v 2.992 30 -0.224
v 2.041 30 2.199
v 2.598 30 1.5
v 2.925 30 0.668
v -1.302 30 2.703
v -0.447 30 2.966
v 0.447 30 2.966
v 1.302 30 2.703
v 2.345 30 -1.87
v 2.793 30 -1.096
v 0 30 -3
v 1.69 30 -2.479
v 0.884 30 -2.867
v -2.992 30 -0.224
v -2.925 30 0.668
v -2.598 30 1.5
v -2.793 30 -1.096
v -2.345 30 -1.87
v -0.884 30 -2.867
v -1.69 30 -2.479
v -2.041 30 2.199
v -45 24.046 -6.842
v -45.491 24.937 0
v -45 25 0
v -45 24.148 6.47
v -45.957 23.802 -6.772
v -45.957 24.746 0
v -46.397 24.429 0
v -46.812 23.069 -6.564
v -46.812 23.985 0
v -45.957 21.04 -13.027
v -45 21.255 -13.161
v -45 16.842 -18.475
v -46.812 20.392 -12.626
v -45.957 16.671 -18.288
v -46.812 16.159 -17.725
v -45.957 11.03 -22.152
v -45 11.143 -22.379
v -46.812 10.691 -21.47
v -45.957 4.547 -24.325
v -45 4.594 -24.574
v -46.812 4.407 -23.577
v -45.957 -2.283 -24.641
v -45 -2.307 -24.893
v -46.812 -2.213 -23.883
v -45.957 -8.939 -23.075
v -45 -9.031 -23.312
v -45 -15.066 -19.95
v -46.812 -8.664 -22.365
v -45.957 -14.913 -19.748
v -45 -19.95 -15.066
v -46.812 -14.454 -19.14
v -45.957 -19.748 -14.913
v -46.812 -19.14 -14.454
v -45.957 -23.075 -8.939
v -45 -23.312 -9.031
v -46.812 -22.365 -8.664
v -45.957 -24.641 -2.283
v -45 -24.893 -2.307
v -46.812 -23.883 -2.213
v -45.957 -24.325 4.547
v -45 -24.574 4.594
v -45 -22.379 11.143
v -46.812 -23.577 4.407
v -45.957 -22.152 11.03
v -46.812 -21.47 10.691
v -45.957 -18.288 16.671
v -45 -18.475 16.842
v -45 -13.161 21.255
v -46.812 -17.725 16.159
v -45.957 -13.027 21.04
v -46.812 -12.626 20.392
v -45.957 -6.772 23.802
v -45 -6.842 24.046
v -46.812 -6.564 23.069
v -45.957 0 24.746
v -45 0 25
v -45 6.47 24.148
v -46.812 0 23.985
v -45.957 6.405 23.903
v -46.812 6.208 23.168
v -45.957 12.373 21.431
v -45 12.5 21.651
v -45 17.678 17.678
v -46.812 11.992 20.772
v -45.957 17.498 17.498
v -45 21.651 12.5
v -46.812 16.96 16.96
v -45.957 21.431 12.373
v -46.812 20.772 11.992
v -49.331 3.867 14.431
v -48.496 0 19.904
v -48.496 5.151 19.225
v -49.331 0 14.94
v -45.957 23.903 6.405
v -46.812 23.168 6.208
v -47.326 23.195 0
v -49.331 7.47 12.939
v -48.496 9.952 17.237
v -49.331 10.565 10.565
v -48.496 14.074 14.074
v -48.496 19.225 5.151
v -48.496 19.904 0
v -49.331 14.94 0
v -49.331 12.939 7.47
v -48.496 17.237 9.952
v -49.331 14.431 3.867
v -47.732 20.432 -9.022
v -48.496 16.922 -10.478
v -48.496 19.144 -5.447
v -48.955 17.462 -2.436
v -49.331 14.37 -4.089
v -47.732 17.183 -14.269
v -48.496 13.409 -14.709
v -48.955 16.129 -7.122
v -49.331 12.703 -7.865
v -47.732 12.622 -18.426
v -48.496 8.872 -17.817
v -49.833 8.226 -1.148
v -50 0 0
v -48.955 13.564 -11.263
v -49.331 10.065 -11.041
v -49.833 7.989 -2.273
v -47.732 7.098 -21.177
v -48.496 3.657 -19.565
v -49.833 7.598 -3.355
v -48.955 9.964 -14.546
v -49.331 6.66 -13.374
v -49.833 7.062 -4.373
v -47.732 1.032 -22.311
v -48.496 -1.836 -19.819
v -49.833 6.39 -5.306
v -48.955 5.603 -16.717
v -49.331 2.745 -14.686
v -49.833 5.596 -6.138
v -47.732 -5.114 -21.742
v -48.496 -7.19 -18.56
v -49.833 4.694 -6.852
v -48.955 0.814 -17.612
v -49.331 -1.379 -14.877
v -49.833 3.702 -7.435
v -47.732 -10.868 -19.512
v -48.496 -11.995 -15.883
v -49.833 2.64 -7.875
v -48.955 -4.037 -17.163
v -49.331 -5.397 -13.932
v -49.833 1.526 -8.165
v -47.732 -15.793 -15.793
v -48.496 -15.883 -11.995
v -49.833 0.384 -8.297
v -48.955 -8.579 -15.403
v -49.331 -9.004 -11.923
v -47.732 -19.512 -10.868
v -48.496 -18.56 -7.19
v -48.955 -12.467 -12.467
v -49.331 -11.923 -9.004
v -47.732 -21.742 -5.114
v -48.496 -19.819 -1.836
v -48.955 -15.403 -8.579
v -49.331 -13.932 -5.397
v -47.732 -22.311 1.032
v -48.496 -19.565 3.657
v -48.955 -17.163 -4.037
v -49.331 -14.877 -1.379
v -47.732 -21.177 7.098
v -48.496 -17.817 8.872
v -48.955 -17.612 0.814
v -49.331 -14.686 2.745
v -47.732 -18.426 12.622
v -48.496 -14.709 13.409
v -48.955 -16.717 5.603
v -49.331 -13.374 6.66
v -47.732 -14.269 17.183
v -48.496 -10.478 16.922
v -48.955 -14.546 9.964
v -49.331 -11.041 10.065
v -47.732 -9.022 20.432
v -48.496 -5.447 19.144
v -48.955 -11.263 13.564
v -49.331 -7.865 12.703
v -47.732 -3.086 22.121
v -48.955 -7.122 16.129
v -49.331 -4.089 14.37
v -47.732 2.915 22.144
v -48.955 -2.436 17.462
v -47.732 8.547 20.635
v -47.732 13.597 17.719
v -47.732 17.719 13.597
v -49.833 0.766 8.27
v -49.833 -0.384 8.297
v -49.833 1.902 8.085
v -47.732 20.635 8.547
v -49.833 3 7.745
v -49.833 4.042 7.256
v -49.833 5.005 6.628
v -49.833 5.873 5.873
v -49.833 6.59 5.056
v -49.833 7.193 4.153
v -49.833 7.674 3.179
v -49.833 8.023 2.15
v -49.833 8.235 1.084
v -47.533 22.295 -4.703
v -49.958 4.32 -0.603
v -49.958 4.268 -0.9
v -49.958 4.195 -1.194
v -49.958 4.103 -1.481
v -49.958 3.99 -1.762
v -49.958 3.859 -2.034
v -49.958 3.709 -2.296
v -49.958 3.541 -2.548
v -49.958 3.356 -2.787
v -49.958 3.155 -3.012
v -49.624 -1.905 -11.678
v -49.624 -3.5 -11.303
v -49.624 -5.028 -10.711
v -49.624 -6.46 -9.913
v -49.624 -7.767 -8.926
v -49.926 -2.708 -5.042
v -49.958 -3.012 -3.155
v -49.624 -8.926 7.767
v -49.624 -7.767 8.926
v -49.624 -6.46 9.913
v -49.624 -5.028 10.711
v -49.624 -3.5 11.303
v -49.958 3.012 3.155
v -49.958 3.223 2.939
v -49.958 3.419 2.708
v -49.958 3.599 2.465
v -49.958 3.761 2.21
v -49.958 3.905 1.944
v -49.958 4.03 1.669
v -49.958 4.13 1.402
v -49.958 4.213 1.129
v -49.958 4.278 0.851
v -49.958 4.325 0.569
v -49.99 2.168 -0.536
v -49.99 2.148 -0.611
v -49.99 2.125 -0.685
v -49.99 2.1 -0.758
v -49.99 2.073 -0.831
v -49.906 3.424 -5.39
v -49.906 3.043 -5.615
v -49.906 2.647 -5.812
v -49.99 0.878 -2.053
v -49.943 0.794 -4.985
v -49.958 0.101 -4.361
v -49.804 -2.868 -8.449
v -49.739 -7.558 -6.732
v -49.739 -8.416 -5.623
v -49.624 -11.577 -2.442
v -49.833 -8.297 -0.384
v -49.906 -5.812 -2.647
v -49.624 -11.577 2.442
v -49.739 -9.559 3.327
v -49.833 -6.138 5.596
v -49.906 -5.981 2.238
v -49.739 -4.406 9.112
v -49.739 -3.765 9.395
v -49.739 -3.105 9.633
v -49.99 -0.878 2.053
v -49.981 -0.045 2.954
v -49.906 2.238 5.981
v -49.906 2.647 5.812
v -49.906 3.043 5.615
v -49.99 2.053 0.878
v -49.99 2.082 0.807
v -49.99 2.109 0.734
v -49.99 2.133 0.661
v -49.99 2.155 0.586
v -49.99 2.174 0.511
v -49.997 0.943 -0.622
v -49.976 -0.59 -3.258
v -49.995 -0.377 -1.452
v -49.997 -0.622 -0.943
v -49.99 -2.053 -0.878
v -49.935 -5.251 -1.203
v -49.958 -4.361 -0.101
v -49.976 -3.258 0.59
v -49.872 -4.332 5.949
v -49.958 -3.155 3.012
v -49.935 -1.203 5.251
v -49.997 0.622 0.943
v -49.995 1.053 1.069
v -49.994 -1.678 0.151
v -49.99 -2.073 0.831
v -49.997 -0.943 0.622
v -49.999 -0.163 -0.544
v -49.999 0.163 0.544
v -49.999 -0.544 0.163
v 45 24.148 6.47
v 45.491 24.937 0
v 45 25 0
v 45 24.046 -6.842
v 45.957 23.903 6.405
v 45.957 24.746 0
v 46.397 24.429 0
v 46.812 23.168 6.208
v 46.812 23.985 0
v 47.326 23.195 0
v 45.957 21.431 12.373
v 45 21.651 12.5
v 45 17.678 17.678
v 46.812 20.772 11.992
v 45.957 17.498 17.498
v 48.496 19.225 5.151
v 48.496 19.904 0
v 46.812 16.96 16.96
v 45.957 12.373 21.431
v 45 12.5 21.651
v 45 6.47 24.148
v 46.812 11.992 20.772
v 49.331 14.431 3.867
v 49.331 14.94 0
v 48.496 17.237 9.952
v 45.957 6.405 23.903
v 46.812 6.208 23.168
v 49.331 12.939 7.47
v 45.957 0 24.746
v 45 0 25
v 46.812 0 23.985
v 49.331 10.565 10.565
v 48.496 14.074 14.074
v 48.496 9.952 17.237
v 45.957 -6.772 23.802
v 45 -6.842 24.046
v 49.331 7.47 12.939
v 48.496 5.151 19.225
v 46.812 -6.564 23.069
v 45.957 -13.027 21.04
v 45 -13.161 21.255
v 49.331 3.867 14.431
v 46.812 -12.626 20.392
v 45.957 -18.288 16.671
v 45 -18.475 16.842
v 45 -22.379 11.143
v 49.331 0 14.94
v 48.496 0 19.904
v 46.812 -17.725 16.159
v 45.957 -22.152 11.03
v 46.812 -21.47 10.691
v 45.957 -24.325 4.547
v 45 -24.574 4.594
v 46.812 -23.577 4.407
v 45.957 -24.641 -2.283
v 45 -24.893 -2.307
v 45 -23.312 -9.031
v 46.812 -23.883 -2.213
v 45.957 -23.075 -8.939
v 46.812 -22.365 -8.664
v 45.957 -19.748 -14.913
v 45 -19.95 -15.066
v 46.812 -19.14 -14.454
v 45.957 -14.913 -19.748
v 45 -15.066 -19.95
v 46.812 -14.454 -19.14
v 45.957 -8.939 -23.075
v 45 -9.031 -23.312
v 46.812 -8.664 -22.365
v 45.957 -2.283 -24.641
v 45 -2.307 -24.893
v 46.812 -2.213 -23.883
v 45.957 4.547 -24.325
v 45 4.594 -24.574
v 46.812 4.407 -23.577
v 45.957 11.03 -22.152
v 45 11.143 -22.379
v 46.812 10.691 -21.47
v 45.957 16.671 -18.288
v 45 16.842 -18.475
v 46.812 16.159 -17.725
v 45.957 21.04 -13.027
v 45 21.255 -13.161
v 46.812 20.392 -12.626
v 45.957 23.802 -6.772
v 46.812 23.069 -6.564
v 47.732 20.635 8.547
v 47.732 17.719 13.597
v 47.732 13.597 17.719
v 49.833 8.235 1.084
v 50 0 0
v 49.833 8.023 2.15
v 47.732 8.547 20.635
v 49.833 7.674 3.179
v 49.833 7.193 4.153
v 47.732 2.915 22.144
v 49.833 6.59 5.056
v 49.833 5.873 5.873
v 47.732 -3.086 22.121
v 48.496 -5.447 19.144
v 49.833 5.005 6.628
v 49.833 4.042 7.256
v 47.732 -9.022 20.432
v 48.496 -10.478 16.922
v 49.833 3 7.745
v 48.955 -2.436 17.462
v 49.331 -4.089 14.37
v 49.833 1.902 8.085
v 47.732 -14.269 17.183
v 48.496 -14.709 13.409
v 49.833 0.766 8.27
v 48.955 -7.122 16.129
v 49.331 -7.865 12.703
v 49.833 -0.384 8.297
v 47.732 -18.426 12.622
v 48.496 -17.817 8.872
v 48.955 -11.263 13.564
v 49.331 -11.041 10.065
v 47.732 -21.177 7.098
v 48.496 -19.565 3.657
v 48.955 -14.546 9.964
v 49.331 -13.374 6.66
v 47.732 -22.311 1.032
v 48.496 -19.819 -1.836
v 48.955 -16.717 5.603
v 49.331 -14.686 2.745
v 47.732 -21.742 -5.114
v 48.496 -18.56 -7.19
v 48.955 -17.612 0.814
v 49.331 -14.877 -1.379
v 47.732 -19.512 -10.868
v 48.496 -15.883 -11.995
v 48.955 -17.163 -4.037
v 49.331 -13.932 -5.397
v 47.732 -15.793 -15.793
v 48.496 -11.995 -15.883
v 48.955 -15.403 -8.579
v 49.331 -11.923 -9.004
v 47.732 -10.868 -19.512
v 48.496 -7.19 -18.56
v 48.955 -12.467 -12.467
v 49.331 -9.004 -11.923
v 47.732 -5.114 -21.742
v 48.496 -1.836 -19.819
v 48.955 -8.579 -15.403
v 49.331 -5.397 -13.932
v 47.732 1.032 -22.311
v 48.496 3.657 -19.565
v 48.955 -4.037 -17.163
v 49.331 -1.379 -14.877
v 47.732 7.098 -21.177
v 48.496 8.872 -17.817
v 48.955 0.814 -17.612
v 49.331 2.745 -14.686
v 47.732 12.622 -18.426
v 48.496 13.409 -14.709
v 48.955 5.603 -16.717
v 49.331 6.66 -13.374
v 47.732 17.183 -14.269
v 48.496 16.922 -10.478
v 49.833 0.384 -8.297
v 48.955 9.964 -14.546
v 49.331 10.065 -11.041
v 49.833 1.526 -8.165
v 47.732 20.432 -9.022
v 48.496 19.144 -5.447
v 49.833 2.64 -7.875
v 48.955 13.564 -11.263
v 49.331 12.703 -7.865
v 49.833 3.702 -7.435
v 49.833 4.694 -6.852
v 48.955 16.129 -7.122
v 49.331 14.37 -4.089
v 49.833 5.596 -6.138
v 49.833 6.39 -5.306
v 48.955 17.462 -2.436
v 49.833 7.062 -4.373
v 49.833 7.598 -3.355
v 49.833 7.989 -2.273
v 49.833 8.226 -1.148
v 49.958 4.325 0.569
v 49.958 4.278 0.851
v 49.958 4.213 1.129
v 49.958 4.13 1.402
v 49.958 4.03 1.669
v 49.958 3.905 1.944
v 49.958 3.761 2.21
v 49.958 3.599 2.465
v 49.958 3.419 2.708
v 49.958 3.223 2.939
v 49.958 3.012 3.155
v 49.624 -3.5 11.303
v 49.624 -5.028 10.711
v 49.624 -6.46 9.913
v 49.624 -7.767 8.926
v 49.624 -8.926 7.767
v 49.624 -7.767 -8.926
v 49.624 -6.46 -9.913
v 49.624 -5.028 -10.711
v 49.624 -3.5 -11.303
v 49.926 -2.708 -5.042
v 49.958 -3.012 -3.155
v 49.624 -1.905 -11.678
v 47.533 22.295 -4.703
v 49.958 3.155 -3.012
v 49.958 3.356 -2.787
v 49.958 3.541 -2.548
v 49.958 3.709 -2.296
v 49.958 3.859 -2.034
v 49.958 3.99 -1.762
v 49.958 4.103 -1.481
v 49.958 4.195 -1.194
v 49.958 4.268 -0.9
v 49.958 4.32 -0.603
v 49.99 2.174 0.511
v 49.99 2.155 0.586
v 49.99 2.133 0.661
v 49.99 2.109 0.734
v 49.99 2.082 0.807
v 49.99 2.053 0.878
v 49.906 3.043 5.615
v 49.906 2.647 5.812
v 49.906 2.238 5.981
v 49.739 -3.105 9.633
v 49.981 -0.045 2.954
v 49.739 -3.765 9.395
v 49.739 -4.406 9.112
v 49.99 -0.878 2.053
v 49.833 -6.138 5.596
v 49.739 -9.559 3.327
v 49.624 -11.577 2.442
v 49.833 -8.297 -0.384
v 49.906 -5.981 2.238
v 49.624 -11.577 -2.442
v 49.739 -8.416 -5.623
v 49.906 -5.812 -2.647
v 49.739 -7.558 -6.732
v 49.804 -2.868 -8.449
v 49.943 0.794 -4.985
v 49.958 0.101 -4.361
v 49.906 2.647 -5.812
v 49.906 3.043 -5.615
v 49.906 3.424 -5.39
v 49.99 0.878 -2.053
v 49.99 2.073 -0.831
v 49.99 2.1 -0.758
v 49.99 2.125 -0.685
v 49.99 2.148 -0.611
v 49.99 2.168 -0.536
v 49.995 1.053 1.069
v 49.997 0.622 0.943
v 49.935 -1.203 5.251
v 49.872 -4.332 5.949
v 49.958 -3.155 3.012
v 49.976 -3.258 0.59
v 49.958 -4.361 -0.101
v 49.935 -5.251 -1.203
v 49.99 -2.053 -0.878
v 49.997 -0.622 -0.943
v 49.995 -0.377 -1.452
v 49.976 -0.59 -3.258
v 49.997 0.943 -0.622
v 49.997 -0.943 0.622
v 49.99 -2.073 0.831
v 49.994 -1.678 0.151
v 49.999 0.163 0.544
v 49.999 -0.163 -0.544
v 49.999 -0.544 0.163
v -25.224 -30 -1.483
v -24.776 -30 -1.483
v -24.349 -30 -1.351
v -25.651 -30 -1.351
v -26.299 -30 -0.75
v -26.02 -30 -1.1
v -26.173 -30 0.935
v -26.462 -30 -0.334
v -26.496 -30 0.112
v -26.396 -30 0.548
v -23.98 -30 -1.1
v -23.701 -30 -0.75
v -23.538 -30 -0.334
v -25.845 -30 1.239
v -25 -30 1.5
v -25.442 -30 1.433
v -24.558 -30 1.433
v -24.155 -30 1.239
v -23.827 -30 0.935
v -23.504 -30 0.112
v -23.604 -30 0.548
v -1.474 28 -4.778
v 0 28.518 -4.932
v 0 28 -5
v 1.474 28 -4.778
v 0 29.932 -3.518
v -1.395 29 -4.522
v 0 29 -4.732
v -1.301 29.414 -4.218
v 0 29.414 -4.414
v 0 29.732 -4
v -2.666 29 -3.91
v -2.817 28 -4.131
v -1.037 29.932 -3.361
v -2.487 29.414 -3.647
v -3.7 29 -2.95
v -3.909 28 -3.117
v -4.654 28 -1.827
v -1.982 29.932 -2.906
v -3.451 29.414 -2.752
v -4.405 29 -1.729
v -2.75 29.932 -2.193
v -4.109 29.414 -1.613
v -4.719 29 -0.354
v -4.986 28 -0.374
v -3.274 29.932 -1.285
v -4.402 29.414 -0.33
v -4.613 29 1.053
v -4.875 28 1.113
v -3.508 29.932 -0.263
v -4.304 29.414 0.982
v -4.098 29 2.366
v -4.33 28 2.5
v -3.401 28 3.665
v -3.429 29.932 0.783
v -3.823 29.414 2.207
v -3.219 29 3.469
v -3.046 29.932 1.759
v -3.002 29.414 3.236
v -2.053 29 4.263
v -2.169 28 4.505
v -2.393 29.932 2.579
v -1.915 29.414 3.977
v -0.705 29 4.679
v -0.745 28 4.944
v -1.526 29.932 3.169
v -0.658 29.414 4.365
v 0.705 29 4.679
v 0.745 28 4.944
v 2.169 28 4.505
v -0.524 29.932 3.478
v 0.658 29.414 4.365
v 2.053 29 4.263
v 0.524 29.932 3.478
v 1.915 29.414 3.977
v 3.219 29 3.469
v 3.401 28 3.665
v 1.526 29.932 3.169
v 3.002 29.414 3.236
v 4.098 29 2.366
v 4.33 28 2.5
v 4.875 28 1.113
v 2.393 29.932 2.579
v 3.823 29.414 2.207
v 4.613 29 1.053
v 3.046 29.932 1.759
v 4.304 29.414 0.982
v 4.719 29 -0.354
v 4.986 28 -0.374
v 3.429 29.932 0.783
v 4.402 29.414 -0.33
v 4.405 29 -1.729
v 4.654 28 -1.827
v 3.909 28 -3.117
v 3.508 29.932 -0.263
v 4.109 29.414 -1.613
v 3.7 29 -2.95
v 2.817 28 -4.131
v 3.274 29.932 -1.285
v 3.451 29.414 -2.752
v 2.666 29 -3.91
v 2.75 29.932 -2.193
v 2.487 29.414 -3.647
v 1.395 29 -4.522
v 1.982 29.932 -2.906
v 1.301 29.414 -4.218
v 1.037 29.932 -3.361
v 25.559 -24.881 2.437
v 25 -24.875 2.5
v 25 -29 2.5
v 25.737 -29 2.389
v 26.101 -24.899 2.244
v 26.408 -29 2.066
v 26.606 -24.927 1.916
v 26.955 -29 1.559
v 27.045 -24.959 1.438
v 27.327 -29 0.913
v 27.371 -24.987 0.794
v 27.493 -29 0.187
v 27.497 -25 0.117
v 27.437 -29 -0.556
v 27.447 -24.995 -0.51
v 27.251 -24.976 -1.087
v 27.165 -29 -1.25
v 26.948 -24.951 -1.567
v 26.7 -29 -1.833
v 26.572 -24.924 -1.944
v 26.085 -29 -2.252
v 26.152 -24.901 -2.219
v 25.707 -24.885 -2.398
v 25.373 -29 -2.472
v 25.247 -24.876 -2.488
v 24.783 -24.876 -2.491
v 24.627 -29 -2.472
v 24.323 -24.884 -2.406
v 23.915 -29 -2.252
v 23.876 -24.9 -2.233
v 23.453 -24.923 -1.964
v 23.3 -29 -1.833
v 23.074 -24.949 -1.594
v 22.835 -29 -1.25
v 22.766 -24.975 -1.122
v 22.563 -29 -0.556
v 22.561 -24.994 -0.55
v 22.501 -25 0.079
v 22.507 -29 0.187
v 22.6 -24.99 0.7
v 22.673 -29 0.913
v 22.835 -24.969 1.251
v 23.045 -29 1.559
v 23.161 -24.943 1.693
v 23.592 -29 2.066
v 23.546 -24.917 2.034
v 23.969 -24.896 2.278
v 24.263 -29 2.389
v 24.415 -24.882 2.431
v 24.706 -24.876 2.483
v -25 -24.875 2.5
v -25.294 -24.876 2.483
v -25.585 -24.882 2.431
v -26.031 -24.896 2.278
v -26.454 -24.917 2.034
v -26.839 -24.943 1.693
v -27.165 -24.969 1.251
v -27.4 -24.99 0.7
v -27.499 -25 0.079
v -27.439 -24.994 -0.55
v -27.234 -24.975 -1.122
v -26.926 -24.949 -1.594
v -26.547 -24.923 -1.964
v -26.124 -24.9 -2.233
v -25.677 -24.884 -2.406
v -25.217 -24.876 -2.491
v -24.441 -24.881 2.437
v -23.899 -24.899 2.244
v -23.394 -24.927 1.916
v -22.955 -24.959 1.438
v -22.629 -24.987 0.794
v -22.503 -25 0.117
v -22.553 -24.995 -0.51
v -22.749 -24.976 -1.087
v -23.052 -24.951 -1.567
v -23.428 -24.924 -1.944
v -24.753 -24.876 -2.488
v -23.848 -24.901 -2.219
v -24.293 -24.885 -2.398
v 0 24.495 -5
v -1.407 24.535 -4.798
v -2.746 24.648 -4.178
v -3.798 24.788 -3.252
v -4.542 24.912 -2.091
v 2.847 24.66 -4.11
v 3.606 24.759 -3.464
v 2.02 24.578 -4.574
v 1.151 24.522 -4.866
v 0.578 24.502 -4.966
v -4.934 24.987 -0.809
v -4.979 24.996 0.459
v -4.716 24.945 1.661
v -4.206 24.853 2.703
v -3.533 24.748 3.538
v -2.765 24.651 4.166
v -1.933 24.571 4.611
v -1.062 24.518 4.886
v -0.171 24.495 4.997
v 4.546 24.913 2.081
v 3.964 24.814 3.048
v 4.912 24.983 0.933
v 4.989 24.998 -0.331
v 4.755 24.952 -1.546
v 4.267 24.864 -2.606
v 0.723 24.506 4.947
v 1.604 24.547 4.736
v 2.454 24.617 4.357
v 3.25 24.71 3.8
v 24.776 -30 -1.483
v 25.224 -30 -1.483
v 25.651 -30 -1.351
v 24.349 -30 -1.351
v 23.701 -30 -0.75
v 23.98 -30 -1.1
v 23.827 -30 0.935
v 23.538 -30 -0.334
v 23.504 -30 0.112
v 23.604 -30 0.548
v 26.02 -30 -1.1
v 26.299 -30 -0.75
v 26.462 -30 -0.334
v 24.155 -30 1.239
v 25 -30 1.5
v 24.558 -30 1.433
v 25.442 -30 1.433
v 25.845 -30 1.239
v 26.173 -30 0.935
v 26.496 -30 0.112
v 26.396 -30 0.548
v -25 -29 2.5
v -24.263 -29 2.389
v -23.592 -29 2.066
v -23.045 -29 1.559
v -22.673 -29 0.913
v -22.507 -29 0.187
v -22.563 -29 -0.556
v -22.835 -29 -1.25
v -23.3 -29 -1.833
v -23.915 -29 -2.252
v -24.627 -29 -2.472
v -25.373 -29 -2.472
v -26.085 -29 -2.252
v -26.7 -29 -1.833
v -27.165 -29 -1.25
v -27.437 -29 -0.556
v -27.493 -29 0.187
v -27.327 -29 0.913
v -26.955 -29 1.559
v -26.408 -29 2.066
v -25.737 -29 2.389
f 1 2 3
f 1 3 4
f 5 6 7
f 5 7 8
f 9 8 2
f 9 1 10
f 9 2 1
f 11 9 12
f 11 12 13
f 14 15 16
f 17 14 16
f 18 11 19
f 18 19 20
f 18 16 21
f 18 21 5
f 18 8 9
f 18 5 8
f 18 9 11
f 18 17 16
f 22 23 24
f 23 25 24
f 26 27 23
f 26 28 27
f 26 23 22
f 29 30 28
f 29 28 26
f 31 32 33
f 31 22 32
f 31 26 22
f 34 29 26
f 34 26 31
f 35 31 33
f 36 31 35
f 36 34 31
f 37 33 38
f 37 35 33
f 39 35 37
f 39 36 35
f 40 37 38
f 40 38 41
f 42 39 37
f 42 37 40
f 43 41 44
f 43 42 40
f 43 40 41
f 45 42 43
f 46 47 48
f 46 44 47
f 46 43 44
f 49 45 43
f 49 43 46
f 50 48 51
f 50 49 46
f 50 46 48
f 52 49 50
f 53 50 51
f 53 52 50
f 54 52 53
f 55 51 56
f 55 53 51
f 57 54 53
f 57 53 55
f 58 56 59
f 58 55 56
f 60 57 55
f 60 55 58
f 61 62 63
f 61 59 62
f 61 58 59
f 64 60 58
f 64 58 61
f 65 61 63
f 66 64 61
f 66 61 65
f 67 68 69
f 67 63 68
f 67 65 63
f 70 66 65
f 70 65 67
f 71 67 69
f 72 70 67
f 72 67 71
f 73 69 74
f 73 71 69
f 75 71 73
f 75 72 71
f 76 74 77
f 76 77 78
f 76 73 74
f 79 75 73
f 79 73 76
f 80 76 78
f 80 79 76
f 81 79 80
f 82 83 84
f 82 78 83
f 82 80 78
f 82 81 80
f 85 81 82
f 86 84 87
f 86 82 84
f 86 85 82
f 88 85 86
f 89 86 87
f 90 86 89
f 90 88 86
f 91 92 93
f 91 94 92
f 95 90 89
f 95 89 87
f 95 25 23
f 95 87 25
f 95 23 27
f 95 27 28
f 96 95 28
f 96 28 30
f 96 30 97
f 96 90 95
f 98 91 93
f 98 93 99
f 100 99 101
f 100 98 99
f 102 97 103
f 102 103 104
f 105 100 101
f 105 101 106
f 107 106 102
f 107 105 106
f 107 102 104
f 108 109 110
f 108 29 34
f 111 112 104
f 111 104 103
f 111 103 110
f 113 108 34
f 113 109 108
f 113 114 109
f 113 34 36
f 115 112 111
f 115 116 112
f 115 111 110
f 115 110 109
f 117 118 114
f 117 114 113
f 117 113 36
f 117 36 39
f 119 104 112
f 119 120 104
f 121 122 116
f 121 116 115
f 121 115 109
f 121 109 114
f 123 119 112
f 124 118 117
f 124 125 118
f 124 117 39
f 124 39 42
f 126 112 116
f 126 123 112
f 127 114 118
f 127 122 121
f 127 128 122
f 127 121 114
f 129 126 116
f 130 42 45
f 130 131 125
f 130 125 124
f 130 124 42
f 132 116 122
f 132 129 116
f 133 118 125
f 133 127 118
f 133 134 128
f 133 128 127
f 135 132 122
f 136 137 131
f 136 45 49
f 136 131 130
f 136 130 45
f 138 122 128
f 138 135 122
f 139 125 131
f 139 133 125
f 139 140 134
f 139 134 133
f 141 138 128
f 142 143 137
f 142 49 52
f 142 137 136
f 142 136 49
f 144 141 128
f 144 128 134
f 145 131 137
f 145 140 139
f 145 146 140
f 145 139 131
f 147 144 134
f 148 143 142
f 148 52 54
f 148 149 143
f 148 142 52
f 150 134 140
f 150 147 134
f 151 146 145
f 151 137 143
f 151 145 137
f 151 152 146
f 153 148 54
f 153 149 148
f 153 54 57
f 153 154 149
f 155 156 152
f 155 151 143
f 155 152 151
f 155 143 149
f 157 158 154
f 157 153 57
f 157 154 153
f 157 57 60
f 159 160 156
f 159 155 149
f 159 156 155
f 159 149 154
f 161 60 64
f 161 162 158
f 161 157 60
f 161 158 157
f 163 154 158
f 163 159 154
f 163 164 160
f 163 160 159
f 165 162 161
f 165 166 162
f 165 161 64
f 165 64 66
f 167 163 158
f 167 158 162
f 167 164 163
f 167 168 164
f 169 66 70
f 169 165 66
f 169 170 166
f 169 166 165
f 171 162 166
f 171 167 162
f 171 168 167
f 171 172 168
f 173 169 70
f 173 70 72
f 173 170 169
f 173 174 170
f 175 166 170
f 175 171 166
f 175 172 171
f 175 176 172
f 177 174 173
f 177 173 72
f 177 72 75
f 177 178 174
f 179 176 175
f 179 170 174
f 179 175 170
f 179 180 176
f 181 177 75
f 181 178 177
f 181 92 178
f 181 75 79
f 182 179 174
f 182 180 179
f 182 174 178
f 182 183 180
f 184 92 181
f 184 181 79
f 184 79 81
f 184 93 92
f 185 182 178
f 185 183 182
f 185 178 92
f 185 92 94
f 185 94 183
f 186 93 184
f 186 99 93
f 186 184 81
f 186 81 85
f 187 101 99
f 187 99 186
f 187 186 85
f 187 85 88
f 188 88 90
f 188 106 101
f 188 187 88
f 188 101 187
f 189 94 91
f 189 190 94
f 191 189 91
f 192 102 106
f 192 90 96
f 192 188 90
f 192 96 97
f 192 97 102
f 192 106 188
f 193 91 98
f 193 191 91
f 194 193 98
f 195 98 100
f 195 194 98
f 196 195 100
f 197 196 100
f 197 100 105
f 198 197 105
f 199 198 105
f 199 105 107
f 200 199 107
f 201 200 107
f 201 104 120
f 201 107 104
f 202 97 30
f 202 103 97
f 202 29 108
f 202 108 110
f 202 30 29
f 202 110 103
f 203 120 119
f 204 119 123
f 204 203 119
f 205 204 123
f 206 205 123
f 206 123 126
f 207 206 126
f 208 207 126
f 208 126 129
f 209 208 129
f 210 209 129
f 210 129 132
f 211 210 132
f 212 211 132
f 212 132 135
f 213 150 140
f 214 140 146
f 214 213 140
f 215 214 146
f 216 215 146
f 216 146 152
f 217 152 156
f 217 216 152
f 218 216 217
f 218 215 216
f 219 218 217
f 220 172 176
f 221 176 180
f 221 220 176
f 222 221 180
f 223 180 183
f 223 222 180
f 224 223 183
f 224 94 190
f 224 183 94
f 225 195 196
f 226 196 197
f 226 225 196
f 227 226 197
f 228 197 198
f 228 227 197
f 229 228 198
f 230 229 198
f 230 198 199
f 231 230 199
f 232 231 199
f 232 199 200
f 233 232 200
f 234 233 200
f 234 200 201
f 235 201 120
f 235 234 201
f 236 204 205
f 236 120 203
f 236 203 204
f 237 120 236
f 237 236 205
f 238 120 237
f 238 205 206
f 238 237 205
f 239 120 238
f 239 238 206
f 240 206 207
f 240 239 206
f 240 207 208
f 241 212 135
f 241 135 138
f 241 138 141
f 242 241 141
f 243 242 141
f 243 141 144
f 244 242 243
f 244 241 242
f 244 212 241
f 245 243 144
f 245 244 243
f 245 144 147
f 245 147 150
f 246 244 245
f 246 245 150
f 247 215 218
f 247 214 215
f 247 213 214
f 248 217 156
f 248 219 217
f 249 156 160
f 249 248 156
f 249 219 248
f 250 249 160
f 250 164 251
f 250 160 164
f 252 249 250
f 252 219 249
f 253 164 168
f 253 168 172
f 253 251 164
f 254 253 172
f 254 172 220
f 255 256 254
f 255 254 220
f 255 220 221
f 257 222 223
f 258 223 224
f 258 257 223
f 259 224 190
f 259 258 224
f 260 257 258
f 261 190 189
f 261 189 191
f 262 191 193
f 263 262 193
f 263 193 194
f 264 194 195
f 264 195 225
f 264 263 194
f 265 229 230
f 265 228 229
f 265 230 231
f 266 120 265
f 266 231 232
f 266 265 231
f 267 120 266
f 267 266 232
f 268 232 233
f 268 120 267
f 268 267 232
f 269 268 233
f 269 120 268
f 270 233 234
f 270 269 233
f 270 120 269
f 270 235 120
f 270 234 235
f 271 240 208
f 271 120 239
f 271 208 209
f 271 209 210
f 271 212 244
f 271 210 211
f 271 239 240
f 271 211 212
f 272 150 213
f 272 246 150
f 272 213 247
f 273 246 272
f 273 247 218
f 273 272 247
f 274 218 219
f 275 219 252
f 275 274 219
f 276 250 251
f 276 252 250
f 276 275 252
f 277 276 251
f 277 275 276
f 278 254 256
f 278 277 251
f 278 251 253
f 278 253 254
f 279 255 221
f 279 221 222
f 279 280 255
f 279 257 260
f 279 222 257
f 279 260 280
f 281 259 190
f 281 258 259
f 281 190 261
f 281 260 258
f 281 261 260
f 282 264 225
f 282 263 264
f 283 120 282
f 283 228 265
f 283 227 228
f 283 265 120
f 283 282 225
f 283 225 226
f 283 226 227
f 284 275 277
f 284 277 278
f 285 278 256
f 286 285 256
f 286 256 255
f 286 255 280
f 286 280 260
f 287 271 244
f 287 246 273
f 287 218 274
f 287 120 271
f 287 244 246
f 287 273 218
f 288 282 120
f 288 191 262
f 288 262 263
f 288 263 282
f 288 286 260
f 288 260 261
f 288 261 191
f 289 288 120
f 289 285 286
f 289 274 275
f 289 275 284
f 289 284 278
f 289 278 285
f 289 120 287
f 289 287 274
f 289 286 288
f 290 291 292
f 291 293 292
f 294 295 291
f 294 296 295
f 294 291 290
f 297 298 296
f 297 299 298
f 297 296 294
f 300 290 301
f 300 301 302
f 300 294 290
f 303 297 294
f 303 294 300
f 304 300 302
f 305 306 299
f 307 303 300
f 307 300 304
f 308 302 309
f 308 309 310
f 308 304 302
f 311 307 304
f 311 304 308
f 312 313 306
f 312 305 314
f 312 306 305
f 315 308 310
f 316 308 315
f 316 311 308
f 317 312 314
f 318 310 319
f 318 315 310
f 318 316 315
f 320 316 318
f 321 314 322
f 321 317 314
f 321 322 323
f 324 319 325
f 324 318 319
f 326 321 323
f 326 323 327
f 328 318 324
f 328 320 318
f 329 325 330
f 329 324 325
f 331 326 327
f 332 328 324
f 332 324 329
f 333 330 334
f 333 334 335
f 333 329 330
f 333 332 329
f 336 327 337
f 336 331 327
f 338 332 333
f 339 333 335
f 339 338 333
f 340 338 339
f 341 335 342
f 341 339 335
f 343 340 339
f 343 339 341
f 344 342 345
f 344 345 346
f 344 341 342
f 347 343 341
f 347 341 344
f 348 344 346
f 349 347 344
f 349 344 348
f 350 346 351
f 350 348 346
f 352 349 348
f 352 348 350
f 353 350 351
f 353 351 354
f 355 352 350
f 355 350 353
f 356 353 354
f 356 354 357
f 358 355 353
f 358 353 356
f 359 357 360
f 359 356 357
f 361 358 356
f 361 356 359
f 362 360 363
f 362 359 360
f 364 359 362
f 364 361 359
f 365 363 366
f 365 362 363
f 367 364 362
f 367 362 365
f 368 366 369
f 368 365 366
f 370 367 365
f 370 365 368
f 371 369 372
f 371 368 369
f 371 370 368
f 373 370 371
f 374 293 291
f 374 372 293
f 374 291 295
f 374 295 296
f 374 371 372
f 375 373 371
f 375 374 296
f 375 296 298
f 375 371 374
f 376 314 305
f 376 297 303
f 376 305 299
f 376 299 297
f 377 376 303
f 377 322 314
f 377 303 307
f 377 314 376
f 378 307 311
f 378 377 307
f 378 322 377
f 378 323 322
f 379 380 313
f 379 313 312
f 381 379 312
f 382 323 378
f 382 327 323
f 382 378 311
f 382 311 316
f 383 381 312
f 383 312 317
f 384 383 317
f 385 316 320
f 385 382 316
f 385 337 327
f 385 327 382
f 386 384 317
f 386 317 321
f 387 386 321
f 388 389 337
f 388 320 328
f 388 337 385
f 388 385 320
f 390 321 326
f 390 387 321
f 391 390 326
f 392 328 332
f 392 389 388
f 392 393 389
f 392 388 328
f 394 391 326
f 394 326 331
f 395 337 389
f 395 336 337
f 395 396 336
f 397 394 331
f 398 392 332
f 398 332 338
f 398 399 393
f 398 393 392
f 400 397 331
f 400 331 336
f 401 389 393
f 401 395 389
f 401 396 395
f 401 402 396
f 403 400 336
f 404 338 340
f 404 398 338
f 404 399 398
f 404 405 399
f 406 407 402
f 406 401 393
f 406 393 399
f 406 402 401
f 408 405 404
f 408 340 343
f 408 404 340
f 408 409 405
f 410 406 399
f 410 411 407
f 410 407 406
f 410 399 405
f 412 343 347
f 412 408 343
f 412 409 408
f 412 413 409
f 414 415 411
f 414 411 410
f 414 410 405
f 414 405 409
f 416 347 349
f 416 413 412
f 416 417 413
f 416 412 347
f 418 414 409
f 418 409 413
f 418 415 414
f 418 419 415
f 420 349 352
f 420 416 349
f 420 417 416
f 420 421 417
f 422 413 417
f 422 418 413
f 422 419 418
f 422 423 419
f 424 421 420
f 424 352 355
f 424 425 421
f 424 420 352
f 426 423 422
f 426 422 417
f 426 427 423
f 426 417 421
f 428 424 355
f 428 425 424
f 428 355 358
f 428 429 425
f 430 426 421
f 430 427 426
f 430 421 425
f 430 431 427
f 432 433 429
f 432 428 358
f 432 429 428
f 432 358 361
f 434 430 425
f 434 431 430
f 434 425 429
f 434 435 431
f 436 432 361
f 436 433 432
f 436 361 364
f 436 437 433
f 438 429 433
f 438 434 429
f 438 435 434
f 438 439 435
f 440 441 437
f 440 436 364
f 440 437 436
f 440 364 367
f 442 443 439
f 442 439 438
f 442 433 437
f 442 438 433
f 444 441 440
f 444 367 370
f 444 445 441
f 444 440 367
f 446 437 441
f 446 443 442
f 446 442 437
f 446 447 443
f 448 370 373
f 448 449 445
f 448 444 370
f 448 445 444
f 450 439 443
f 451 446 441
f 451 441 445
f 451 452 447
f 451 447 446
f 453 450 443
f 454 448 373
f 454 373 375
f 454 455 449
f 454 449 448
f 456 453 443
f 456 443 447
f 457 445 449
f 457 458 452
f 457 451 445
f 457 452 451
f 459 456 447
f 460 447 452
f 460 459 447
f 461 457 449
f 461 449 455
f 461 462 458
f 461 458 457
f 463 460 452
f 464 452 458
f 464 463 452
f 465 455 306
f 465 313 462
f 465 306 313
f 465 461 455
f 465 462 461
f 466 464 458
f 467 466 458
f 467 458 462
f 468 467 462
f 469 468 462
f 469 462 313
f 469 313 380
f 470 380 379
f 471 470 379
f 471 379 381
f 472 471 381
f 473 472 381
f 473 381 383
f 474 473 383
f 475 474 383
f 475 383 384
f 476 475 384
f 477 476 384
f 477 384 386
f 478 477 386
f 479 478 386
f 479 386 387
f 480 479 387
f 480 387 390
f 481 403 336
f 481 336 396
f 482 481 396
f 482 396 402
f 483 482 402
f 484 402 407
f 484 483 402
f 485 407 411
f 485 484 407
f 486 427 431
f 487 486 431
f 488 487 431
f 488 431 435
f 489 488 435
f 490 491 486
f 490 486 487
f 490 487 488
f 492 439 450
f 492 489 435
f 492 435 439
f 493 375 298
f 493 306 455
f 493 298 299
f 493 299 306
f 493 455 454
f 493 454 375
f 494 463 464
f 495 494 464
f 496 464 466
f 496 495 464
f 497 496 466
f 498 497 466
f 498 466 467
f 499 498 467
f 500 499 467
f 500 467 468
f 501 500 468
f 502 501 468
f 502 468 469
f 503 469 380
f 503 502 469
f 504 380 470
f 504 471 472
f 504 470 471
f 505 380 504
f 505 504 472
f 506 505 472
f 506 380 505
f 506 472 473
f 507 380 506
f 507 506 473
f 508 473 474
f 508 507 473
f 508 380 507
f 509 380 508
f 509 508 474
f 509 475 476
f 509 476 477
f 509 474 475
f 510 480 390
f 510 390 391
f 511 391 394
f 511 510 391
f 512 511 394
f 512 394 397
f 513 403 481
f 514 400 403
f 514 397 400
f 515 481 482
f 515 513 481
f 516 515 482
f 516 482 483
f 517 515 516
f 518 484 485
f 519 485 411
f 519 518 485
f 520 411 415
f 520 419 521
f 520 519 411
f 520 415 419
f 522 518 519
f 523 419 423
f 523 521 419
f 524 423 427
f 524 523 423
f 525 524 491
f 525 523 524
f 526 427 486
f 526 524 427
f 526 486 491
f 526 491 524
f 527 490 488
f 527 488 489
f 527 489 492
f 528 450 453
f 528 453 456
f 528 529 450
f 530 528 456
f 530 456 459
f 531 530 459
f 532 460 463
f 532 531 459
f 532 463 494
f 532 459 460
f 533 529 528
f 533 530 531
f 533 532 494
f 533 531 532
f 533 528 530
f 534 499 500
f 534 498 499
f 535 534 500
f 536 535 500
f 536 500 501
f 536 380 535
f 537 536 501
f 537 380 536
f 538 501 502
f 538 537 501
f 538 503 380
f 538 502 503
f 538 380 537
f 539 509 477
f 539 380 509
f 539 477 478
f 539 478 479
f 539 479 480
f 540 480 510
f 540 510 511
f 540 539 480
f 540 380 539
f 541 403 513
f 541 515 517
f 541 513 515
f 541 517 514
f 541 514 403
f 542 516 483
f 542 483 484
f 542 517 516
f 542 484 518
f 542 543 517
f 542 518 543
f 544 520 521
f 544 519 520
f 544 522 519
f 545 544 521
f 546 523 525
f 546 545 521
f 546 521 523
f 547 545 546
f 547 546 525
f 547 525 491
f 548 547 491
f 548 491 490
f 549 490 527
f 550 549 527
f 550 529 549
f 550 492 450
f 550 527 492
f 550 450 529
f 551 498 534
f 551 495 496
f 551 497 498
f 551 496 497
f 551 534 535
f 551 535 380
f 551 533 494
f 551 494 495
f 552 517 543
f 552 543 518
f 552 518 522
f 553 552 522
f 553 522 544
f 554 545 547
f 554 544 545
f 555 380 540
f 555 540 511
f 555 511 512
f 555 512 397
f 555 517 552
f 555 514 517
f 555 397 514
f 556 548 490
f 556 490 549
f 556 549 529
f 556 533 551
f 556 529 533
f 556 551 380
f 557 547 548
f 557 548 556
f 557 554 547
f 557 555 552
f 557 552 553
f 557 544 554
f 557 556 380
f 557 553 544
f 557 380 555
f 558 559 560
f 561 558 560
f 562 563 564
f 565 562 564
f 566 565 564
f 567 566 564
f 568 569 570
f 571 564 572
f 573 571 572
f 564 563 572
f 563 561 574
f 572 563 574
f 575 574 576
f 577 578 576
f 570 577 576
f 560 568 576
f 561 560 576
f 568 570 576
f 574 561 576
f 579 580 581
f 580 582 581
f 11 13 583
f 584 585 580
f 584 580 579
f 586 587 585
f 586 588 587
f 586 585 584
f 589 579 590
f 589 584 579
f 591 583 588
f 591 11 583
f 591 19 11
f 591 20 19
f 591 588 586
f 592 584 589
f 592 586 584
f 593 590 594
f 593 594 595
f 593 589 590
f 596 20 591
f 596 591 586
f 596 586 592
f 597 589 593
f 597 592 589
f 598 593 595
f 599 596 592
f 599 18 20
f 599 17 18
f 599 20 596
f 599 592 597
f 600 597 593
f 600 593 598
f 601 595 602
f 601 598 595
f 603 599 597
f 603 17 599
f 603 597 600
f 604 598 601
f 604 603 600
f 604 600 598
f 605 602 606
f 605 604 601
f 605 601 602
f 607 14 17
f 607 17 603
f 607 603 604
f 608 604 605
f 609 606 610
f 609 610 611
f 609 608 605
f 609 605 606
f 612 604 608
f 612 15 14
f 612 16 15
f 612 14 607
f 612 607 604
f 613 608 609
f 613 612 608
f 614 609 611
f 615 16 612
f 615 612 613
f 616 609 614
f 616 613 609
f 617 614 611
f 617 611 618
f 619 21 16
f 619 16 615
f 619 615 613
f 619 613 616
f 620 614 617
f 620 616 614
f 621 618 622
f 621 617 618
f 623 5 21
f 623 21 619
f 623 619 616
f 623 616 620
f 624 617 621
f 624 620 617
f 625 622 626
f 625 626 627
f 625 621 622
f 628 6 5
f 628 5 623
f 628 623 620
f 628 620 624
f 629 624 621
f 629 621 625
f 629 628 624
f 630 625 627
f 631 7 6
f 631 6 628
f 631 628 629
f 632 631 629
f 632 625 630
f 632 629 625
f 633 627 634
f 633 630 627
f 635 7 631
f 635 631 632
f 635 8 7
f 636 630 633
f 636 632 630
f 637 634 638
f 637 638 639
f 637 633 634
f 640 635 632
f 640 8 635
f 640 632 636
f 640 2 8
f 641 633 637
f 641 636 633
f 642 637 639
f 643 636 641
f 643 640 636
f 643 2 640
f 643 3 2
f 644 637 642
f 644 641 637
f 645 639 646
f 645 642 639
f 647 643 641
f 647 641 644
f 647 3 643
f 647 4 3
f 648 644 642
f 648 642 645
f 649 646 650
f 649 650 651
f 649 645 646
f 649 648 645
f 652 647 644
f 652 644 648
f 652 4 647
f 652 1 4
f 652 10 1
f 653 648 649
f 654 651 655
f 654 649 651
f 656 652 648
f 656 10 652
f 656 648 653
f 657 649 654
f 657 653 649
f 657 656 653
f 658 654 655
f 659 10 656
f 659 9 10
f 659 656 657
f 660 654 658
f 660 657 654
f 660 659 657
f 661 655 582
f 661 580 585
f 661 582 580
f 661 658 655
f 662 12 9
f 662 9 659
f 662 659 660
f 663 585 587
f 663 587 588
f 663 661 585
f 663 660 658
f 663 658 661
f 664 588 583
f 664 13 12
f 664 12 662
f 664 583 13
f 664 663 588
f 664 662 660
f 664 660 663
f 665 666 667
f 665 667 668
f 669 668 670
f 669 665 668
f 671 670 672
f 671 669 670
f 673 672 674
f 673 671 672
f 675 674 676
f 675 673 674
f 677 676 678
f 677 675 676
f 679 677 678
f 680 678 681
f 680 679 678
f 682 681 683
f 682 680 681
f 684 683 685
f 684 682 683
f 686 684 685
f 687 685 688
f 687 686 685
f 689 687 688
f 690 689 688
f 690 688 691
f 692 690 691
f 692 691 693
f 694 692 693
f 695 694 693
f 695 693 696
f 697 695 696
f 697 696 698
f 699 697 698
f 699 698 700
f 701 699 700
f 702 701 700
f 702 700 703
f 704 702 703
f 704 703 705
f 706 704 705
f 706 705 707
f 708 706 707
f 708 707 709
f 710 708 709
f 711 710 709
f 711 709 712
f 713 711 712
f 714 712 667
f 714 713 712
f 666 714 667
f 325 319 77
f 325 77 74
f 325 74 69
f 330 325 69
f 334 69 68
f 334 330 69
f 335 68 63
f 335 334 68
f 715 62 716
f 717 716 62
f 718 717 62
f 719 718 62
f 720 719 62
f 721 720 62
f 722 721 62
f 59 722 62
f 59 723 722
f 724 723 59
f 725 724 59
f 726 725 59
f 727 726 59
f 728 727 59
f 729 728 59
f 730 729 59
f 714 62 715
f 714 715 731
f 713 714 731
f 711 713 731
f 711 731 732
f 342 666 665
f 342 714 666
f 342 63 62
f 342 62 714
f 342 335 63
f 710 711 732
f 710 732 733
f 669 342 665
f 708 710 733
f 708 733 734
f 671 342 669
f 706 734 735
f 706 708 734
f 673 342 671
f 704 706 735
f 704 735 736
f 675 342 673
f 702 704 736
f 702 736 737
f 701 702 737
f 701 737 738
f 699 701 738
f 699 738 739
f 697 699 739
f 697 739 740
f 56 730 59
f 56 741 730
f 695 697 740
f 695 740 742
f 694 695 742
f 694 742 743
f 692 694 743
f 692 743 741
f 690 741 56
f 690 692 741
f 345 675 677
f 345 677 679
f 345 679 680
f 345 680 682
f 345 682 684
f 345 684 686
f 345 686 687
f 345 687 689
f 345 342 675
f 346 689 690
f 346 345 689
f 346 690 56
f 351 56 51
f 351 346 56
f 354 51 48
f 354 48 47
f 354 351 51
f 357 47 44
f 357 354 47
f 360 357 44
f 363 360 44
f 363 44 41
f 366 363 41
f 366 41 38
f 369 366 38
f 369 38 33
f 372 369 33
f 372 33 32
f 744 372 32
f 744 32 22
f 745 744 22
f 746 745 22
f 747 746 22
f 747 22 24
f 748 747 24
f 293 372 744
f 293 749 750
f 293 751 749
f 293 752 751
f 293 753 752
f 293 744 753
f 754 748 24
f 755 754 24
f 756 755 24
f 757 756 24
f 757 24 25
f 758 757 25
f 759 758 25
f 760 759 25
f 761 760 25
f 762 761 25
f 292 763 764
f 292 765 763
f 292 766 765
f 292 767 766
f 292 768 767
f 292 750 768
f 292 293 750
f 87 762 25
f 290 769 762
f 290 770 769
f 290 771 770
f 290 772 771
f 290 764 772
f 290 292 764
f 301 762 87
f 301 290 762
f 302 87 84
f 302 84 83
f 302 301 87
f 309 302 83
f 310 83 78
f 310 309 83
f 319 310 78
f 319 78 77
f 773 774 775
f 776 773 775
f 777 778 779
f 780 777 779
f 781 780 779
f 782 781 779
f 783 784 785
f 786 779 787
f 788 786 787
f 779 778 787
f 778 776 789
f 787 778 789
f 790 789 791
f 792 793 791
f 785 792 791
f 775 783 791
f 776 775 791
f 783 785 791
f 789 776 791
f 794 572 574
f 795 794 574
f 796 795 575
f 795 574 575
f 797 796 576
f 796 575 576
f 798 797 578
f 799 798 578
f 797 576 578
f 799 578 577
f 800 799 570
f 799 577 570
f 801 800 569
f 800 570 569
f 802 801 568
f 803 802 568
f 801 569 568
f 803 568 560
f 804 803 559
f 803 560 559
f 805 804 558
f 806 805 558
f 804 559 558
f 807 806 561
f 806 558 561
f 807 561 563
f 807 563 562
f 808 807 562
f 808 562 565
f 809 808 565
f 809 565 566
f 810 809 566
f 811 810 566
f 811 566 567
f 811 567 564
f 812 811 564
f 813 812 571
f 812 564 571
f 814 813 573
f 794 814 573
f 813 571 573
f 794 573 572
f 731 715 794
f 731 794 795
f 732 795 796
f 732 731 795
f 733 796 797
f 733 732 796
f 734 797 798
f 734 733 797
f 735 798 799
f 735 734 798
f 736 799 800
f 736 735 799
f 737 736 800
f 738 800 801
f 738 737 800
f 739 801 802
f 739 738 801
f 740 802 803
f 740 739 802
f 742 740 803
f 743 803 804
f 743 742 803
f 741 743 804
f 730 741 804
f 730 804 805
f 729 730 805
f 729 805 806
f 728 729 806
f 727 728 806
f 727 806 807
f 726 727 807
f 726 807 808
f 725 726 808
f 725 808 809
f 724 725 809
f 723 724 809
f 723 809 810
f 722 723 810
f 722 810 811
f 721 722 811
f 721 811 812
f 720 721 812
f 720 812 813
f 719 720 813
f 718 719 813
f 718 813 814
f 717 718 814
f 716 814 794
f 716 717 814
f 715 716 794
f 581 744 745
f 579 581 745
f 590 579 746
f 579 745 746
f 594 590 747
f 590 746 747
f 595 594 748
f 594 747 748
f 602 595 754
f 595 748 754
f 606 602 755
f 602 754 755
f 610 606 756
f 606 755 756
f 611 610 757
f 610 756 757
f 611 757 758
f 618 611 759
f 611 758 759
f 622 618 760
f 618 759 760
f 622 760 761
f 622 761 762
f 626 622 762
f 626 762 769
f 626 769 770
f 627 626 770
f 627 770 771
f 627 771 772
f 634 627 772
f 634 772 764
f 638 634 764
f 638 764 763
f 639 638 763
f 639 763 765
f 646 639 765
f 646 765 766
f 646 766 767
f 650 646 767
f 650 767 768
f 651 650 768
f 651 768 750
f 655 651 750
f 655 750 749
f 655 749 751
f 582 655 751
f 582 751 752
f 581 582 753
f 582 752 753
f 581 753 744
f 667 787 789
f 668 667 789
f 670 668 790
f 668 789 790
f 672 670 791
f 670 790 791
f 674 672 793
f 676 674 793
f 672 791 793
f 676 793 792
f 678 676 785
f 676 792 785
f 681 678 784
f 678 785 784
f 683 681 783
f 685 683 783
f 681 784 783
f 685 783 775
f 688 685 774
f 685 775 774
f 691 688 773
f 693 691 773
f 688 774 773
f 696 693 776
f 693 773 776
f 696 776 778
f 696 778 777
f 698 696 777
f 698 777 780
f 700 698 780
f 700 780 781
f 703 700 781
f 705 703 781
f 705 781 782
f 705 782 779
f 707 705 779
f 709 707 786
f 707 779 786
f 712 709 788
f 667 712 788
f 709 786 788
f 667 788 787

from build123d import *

# Parameters (mm, degrees)
SKETCH1_R           = 25
BOSS_EXTRUDE1_DEPTH = 45
SKETCH3_R           = 5
BOSS_EXTRUDE2_DEPTH = 30
FILLET1_R           = 2
SKETCH4_R           = 2.5
BOSS_EXTRUDE3_DEPTH = 30
CHAMFER1_SIZE       = 1


with BuildPart() as part:
    # Sketch1 → Boss-Extrude1 (new, symmetric)
    with BuildSketch(Plane(origin=(0, 0, 0), x_dir=(0, 0, -1), z_dir=(1, 0, 0))):
        Circle(SKETCH1_R)
    extrude(amount=BOSS_EXTRUDE1_DEPTH, both=True)

    # Sketch2 → Revolve1 (revolve)
    with BuildSketch(Plane.XY):
        with BuildLine():
            Line((-45, 0), (-45, 25))
            add(Edge.make_bspline(
                [(-45, 25), (-50, 25), (-50, 0)],
                knots=[0, 0, 0, 1, 1, 1], degree=2))
            Line((-50, 0), (-45, 0))
        make_face()
    revolve(axis=Axis((-45, 0, 0), (-1, 0, 0)))

    # Sketch2<4> → Revolve2 (revolve)
    with BuildSketch(Plane.XY):
        with BuildLine():
            Line((45, 25), (45, 0))
            Line((45, 0), (50, 0))
            add(Edge.make_bspline(
                [(45, 25), (50, 25), (50, 0)],
                knots=[0, 0, 0, 1, 1, 1], degree=2))
        make_face()
    revolve(axis=Axis((45, 0, 0), (1, 0, 0)))

    # Sketch3 → Boss-Extrude2 (add)
    with BuildSketch(Plane(origin=(0, 0, 0), x_dir=(1, 0, 0), z_dir=(0, 1, 0))):
        Circle(SKETCH3_R)
    extrude(amount=BOSS_EXTRUDE2_DEPTH)

    # Fillet1
    fillet1_edges = [part.edges().sort_by_distance(p)[0] for p in [
        (-5, 30, 0),
    ]]
    fillet(fillet1_edges, radius=FILLET1_R)

    # Sketch4 → Boss-Extrude3 (add)
    with BuildSketch(Plane(origin=(0, 0, 0), x_dir=(1, 0, 0), z_dir=(0, 1, 0))):
        with Locations((-25, 0)):
            Circle(SKETCH4_R)
        with Locations((25, 0)):
            Circle(SKETCH4_R)
    extrude(amount=-BOSS_EXTRUDE3_DEPTH)

    # Chamfer1
    chamfer1_edges = [part.edges().sort_by_distance(p)[0] for p in [
        (22.5, -30, 0),
        (-27.5, -30, 0),
    ]]
    chamfer(chamfer1_edges, length=CHAMFER1_SIZE)


solid = part.part
